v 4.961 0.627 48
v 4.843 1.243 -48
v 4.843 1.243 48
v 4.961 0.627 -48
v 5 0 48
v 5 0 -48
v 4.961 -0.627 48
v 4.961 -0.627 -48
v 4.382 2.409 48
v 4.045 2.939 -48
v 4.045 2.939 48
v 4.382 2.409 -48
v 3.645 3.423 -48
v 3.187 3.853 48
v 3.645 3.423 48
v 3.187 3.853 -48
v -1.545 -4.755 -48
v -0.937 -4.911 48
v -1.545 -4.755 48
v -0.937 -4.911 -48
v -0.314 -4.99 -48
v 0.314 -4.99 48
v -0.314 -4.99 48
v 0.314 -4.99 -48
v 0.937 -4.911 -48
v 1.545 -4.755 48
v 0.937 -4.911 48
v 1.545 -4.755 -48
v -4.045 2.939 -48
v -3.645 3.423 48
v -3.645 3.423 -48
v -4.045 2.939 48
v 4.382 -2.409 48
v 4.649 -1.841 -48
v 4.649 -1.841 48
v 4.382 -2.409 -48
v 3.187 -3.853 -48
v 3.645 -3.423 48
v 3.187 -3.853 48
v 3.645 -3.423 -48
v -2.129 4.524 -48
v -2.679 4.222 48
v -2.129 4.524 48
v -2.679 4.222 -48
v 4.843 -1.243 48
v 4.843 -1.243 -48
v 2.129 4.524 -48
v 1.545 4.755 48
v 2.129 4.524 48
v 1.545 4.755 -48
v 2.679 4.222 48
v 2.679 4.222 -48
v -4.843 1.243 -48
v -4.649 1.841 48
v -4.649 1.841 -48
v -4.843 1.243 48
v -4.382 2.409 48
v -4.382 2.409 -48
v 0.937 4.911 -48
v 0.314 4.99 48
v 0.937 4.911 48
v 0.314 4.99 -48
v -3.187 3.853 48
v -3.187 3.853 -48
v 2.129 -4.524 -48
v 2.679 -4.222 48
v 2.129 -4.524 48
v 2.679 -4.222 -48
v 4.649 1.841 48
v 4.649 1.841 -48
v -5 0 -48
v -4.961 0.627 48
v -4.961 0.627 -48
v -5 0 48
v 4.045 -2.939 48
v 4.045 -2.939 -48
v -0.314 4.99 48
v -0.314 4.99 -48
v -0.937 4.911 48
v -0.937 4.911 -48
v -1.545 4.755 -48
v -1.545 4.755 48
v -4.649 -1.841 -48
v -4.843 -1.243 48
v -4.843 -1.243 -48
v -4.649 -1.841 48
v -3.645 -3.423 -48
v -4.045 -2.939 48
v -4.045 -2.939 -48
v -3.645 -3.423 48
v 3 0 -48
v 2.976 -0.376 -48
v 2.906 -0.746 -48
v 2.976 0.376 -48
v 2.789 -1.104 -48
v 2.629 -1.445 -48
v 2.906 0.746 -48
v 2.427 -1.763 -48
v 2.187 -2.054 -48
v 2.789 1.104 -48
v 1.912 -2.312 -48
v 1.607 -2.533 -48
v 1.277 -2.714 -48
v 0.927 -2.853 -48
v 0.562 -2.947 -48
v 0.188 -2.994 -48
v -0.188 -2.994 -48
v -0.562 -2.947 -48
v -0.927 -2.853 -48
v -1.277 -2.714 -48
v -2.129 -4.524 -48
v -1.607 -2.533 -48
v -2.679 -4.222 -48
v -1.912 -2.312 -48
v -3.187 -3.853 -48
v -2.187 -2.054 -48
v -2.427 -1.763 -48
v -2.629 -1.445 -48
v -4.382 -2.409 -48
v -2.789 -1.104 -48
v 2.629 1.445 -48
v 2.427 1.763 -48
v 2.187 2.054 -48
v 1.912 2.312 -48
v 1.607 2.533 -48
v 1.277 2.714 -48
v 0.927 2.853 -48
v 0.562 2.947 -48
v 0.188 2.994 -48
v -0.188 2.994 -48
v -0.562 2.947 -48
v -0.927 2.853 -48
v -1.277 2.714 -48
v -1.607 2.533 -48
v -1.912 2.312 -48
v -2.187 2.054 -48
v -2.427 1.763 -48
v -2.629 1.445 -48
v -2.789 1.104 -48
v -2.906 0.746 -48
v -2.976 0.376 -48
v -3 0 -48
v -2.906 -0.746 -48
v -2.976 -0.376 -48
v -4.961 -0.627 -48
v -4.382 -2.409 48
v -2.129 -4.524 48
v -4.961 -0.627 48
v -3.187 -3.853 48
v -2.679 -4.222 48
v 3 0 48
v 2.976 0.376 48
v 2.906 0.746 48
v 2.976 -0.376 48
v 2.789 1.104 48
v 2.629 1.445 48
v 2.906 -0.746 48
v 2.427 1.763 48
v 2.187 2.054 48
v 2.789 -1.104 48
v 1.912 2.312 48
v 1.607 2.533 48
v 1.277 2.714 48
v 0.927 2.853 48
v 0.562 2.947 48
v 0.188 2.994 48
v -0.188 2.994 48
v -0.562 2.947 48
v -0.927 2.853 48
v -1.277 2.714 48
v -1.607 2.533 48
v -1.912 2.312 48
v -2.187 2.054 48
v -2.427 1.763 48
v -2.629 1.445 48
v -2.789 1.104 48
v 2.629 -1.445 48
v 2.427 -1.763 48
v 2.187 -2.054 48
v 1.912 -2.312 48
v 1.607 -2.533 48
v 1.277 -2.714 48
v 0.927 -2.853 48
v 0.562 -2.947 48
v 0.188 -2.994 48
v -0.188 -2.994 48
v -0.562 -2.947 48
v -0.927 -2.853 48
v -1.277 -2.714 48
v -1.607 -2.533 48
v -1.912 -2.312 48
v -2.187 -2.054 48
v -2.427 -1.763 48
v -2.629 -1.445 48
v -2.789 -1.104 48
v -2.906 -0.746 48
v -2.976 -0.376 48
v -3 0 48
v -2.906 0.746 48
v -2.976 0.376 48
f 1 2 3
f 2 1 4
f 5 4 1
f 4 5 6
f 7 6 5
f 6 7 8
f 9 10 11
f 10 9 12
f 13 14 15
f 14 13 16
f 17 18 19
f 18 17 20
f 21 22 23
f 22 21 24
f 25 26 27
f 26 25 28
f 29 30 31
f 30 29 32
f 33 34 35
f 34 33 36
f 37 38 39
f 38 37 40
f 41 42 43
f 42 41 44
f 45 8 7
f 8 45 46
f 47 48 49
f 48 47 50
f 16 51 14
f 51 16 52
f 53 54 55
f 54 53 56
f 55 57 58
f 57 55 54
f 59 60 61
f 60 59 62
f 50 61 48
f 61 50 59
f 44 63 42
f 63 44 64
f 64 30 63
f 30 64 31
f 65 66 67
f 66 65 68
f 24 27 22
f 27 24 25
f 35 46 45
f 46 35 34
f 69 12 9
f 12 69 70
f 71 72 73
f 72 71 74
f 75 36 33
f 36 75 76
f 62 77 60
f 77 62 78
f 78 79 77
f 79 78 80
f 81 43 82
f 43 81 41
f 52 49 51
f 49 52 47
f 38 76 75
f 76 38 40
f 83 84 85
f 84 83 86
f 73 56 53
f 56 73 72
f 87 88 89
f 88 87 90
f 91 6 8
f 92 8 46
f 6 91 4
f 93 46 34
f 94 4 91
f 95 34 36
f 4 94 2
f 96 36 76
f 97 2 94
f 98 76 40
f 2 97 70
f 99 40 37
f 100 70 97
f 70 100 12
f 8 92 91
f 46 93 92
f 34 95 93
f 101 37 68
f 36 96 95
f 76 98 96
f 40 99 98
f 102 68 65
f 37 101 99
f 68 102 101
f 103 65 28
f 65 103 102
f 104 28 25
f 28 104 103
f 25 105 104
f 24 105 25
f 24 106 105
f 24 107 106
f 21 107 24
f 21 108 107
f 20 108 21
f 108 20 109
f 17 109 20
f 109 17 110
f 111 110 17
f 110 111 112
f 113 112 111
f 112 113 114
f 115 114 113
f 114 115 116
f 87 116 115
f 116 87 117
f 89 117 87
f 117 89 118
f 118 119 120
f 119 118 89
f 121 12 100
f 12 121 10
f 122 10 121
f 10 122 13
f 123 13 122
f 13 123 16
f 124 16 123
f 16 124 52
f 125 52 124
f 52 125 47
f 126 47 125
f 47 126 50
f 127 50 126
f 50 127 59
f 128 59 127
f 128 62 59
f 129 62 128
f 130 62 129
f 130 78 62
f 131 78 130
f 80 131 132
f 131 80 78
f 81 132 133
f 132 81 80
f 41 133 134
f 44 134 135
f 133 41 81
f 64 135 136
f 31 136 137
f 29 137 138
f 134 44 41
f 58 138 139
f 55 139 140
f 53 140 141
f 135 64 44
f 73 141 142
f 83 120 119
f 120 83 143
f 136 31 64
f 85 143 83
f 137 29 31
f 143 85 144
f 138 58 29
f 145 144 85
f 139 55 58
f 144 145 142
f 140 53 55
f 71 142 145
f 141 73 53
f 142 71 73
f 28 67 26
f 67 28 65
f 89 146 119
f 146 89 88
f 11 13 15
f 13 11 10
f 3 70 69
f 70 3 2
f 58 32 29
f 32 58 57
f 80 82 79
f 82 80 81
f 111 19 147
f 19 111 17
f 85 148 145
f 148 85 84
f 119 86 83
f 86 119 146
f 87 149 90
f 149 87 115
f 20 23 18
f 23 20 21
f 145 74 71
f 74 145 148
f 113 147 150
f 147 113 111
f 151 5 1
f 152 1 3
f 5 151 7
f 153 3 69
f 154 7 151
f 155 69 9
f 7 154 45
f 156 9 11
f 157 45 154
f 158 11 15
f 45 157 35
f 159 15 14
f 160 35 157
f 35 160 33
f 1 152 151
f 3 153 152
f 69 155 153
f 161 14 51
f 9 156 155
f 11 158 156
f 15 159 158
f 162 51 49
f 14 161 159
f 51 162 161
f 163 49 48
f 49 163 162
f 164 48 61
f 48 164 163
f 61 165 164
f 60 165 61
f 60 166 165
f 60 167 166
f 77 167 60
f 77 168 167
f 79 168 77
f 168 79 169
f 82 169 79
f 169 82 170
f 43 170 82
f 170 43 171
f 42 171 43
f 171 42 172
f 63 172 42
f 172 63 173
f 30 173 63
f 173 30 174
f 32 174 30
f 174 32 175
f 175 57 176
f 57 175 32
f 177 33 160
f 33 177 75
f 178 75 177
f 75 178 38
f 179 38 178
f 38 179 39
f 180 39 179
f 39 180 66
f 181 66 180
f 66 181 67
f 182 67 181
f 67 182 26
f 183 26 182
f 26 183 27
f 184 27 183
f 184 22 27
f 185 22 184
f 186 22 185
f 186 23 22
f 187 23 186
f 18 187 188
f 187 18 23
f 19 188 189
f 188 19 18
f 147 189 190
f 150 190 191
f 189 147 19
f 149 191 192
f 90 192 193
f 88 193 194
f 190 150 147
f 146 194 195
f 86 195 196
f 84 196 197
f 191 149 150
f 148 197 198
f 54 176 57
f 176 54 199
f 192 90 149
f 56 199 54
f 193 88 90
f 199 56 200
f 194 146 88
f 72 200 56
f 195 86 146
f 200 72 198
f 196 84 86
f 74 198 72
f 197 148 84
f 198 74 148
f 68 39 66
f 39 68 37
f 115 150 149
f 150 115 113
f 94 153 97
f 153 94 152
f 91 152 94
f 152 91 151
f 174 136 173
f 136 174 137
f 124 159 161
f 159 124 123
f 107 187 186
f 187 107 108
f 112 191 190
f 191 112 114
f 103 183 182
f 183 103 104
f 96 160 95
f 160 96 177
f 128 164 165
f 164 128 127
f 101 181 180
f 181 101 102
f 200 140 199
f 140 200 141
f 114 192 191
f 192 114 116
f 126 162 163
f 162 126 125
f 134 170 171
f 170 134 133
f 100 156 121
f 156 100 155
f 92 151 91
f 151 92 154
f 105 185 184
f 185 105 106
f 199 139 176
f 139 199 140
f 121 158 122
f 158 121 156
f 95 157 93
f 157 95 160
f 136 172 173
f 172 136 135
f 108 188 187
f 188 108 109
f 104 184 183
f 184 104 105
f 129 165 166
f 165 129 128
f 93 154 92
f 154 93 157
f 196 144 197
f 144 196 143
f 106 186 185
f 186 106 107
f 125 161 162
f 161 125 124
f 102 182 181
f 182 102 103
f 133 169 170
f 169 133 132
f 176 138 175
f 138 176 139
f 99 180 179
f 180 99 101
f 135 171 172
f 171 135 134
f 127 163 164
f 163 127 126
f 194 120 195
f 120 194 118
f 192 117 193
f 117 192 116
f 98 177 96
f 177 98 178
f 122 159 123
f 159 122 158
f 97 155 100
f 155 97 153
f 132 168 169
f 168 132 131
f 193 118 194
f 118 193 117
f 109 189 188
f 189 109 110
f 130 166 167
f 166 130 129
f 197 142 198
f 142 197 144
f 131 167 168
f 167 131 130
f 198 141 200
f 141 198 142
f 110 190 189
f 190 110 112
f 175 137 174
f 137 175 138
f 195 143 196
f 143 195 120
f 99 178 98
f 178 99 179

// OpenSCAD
$fn = 50;


difference() {
	union() {
		translate(v = [0, 0, -48.0000000000]) {
			cylinder(h = 96, r = 5.0000000000);
		}
	}
	union() {
		translate(v = [0, 0, -100.0000000000]) {
			cylinder(h = 200, r = 3.0000000000);
		}
	}
}
